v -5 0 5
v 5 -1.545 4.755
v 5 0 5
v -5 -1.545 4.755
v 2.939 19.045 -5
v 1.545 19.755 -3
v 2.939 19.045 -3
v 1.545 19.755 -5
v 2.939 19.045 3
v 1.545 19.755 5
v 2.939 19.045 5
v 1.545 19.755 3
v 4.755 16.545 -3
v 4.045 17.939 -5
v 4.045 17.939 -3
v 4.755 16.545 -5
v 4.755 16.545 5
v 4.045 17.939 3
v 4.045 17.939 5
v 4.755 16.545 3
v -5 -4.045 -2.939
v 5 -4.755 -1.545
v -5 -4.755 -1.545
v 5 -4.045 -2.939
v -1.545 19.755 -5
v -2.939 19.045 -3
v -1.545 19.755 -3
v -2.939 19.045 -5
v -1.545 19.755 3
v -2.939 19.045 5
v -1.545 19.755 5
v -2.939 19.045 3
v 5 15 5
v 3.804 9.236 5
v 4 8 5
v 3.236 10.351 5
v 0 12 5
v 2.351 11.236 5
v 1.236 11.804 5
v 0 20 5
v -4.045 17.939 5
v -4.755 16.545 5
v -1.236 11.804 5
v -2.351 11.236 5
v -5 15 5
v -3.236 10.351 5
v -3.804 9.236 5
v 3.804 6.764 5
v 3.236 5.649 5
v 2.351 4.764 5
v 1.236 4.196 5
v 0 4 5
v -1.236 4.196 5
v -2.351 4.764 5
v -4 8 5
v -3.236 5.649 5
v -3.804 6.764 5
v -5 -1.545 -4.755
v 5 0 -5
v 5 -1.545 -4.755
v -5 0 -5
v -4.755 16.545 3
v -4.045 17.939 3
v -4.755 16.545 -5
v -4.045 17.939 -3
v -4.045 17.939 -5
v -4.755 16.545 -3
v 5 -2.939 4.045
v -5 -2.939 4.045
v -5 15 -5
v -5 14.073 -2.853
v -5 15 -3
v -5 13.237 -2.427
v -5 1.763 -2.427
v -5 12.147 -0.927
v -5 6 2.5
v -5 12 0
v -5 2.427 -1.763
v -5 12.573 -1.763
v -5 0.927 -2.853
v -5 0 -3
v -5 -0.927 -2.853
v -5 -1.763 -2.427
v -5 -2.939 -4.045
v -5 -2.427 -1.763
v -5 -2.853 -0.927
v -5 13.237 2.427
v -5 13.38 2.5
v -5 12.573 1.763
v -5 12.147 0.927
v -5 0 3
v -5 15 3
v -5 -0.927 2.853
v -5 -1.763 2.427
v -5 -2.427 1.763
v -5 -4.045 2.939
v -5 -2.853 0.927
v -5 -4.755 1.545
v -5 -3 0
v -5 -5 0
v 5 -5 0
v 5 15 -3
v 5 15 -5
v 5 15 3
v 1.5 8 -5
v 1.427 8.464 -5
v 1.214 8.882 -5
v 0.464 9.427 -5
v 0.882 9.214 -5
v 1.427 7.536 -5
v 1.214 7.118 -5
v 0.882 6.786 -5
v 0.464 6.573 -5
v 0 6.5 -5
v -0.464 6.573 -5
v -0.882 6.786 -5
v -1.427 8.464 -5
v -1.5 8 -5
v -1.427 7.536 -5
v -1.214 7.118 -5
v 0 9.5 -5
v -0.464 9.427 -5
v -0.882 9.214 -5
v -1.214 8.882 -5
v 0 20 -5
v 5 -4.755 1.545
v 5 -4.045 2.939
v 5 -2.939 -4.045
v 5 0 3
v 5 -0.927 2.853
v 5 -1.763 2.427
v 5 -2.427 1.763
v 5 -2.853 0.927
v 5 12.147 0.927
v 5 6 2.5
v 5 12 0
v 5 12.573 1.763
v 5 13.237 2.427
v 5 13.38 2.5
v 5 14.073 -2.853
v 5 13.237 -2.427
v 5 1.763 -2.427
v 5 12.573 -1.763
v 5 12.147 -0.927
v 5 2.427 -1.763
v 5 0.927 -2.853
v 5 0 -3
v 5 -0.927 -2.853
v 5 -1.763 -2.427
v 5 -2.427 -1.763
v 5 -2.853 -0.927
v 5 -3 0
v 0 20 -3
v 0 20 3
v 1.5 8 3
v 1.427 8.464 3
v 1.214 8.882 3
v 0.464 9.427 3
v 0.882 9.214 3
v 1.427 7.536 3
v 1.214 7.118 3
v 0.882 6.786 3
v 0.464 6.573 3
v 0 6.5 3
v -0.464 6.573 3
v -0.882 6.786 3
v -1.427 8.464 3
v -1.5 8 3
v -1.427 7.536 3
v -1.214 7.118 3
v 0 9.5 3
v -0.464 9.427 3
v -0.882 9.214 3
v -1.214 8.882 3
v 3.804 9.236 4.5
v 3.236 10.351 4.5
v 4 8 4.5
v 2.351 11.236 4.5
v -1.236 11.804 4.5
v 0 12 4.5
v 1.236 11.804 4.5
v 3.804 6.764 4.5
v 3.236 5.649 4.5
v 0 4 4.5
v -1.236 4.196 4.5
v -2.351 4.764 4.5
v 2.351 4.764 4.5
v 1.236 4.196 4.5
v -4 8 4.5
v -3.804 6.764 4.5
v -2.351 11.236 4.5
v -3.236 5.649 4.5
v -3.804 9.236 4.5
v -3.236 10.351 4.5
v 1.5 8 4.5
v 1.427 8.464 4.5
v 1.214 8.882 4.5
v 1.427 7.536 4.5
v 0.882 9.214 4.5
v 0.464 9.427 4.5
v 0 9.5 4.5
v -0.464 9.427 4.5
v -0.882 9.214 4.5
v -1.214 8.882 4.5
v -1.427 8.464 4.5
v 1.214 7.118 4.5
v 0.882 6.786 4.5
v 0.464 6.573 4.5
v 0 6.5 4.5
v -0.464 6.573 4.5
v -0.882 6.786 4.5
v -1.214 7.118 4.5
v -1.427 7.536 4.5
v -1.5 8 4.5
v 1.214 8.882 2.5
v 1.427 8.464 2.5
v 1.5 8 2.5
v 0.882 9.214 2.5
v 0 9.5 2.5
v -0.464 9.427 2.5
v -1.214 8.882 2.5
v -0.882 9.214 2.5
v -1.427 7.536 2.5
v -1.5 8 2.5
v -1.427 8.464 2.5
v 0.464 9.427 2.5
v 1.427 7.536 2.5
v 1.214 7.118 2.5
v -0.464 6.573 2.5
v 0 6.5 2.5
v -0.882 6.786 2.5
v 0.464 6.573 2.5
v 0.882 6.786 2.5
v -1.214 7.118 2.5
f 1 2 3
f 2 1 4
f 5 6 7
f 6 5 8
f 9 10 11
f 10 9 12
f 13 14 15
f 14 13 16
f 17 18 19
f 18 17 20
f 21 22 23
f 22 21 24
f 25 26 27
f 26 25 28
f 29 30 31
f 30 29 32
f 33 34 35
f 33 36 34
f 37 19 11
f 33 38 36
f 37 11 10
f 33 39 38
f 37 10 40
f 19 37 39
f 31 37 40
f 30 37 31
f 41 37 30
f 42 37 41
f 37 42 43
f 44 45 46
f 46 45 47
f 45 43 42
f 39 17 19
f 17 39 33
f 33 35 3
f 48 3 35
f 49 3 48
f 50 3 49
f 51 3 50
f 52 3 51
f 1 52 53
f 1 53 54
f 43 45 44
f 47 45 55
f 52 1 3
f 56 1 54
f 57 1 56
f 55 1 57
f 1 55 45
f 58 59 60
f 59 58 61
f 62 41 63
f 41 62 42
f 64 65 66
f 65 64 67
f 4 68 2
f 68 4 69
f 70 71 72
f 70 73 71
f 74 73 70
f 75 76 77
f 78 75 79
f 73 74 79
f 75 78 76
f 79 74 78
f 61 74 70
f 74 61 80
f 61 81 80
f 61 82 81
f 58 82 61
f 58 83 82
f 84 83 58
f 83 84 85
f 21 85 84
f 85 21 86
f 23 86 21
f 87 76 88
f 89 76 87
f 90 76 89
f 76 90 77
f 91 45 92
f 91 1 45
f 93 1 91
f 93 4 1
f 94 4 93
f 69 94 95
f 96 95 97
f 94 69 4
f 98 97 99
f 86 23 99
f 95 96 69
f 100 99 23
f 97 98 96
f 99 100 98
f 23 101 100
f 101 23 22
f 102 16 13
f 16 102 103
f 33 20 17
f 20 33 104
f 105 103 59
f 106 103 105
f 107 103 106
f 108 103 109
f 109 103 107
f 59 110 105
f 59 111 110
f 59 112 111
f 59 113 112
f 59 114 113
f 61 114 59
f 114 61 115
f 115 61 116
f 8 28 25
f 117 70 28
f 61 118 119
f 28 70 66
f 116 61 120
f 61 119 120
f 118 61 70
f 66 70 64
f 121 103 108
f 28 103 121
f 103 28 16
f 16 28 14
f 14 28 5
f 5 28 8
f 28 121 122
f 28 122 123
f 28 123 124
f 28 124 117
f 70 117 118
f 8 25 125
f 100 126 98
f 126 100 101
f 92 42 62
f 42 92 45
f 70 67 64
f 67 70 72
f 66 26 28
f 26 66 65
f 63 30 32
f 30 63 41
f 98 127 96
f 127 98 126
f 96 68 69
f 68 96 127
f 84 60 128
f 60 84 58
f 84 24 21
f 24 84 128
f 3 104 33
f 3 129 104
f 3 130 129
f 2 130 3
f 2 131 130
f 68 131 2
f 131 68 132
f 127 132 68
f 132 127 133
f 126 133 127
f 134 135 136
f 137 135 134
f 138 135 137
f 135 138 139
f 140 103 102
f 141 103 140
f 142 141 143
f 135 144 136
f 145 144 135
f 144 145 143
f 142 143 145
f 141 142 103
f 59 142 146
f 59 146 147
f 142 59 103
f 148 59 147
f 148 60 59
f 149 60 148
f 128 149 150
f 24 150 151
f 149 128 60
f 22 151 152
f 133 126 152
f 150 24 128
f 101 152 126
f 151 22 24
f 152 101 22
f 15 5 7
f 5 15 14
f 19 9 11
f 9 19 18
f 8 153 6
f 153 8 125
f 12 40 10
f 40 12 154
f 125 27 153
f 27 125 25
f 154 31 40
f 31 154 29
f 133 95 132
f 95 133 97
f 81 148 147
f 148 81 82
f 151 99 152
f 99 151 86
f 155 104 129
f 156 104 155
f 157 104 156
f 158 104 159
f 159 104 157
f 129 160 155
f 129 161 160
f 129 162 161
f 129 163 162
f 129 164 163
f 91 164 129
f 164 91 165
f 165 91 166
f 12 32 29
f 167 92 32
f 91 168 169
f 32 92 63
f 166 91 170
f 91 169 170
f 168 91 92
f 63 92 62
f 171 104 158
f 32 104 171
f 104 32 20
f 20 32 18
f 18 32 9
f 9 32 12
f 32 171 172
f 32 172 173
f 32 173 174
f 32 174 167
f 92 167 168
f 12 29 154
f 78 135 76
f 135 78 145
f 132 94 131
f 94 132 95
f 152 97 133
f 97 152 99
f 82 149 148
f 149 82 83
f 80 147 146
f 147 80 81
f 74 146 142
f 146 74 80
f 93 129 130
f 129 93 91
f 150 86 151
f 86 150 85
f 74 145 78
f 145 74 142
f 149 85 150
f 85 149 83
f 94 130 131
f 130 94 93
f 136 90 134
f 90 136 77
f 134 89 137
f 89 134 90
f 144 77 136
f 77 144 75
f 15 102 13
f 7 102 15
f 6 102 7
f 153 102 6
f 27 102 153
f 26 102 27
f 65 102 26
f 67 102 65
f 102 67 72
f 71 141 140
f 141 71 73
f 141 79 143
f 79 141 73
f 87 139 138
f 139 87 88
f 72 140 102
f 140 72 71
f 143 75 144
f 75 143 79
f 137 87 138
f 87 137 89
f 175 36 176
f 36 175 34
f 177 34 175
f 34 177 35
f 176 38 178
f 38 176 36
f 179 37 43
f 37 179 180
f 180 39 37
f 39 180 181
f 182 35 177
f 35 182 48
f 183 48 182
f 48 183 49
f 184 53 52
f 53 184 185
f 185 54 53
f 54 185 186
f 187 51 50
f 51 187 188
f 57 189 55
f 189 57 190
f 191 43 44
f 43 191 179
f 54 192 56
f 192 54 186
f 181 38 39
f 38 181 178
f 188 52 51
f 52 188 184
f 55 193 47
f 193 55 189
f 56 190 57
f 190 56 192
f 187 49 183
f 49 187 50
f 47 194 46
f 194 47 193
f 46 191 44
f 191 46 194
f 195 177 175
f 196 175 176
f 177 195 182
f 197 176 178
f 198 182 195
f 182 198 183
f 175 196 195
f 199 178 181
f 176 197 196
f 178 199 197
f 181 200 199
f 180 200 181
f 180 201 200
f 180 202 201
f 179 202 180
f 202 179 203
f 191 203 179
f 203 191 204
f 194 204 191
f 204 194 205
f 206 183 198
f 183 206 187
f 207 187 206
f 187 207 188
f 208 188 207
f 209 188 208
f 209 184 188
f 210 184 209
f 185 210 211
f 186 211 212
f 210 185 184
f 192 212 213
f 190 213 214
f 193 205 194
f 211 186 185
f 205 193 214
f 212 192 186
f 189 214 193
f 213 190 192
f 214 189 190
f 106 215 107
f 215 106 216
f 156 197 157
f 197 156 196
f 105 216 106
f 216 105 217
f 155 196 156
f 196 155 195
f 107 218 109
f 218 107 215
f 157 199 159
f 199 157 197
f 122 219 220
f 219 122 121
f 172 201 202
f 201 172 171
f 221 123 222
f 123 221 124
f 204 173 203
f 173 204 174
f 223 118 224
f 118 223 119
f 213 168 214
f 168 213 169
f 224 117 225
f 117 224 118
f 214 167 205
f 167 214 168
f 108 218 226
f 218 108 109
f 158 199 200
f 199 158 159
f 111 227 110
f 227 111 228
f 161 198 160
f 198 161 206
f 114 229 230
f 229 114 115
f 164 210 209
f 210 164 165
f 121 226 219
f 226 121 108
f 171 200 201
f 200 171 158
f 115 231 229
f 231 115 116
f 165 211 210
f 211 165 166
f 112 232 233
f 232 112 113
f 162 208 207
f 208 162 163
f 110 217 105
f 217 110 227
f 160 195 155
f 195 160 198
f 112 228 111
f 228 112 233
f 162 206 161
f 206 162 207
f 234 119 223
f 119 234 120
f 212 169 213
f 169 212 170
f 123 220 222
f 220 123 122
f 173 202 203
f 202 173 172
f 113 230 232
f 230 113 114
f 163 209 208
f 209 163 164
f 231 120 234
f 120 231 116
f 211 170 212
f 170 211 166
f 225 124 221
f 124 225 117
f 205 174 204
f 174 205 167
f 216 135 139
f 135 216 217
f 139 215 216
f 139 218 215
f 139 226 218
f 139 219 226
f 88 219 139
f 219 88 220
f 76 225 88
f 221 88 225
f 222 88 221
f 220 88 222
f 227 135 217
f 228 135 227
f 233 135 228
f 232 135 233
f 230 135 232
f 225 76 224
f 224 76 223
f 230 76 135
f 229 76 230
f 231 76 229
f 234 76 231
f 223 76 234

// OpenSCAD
$fn=20;
difference(){
    hull(){
        rotate([0,90,0]) cylinder(r=5, h=10, center = true);
        translate([0,15,0]) cylinder(r=5, h=10, center = true);
    }
    hull(){
        rotate([0,90,0]) cylinder(r=3, h=12, center = true);
        translate([0,3,2.75]) cube([12,6,0.5],center=true);
    }
    translate([0,15,0]) rotate([0,90,0]) hull(){
        cylinder(r=3, h=12, center = true);
        translate([0,10,0]) cube([6,6,12], center = true);
    }
    translate([0,8,4.5]) cylinder(r=4, h=10);
    translate([0,8,0]) cylinder(r=1.5, h=12,center=true);
    translate([0,15,2.75]) cube([12,30,0.5],center=true);
}
